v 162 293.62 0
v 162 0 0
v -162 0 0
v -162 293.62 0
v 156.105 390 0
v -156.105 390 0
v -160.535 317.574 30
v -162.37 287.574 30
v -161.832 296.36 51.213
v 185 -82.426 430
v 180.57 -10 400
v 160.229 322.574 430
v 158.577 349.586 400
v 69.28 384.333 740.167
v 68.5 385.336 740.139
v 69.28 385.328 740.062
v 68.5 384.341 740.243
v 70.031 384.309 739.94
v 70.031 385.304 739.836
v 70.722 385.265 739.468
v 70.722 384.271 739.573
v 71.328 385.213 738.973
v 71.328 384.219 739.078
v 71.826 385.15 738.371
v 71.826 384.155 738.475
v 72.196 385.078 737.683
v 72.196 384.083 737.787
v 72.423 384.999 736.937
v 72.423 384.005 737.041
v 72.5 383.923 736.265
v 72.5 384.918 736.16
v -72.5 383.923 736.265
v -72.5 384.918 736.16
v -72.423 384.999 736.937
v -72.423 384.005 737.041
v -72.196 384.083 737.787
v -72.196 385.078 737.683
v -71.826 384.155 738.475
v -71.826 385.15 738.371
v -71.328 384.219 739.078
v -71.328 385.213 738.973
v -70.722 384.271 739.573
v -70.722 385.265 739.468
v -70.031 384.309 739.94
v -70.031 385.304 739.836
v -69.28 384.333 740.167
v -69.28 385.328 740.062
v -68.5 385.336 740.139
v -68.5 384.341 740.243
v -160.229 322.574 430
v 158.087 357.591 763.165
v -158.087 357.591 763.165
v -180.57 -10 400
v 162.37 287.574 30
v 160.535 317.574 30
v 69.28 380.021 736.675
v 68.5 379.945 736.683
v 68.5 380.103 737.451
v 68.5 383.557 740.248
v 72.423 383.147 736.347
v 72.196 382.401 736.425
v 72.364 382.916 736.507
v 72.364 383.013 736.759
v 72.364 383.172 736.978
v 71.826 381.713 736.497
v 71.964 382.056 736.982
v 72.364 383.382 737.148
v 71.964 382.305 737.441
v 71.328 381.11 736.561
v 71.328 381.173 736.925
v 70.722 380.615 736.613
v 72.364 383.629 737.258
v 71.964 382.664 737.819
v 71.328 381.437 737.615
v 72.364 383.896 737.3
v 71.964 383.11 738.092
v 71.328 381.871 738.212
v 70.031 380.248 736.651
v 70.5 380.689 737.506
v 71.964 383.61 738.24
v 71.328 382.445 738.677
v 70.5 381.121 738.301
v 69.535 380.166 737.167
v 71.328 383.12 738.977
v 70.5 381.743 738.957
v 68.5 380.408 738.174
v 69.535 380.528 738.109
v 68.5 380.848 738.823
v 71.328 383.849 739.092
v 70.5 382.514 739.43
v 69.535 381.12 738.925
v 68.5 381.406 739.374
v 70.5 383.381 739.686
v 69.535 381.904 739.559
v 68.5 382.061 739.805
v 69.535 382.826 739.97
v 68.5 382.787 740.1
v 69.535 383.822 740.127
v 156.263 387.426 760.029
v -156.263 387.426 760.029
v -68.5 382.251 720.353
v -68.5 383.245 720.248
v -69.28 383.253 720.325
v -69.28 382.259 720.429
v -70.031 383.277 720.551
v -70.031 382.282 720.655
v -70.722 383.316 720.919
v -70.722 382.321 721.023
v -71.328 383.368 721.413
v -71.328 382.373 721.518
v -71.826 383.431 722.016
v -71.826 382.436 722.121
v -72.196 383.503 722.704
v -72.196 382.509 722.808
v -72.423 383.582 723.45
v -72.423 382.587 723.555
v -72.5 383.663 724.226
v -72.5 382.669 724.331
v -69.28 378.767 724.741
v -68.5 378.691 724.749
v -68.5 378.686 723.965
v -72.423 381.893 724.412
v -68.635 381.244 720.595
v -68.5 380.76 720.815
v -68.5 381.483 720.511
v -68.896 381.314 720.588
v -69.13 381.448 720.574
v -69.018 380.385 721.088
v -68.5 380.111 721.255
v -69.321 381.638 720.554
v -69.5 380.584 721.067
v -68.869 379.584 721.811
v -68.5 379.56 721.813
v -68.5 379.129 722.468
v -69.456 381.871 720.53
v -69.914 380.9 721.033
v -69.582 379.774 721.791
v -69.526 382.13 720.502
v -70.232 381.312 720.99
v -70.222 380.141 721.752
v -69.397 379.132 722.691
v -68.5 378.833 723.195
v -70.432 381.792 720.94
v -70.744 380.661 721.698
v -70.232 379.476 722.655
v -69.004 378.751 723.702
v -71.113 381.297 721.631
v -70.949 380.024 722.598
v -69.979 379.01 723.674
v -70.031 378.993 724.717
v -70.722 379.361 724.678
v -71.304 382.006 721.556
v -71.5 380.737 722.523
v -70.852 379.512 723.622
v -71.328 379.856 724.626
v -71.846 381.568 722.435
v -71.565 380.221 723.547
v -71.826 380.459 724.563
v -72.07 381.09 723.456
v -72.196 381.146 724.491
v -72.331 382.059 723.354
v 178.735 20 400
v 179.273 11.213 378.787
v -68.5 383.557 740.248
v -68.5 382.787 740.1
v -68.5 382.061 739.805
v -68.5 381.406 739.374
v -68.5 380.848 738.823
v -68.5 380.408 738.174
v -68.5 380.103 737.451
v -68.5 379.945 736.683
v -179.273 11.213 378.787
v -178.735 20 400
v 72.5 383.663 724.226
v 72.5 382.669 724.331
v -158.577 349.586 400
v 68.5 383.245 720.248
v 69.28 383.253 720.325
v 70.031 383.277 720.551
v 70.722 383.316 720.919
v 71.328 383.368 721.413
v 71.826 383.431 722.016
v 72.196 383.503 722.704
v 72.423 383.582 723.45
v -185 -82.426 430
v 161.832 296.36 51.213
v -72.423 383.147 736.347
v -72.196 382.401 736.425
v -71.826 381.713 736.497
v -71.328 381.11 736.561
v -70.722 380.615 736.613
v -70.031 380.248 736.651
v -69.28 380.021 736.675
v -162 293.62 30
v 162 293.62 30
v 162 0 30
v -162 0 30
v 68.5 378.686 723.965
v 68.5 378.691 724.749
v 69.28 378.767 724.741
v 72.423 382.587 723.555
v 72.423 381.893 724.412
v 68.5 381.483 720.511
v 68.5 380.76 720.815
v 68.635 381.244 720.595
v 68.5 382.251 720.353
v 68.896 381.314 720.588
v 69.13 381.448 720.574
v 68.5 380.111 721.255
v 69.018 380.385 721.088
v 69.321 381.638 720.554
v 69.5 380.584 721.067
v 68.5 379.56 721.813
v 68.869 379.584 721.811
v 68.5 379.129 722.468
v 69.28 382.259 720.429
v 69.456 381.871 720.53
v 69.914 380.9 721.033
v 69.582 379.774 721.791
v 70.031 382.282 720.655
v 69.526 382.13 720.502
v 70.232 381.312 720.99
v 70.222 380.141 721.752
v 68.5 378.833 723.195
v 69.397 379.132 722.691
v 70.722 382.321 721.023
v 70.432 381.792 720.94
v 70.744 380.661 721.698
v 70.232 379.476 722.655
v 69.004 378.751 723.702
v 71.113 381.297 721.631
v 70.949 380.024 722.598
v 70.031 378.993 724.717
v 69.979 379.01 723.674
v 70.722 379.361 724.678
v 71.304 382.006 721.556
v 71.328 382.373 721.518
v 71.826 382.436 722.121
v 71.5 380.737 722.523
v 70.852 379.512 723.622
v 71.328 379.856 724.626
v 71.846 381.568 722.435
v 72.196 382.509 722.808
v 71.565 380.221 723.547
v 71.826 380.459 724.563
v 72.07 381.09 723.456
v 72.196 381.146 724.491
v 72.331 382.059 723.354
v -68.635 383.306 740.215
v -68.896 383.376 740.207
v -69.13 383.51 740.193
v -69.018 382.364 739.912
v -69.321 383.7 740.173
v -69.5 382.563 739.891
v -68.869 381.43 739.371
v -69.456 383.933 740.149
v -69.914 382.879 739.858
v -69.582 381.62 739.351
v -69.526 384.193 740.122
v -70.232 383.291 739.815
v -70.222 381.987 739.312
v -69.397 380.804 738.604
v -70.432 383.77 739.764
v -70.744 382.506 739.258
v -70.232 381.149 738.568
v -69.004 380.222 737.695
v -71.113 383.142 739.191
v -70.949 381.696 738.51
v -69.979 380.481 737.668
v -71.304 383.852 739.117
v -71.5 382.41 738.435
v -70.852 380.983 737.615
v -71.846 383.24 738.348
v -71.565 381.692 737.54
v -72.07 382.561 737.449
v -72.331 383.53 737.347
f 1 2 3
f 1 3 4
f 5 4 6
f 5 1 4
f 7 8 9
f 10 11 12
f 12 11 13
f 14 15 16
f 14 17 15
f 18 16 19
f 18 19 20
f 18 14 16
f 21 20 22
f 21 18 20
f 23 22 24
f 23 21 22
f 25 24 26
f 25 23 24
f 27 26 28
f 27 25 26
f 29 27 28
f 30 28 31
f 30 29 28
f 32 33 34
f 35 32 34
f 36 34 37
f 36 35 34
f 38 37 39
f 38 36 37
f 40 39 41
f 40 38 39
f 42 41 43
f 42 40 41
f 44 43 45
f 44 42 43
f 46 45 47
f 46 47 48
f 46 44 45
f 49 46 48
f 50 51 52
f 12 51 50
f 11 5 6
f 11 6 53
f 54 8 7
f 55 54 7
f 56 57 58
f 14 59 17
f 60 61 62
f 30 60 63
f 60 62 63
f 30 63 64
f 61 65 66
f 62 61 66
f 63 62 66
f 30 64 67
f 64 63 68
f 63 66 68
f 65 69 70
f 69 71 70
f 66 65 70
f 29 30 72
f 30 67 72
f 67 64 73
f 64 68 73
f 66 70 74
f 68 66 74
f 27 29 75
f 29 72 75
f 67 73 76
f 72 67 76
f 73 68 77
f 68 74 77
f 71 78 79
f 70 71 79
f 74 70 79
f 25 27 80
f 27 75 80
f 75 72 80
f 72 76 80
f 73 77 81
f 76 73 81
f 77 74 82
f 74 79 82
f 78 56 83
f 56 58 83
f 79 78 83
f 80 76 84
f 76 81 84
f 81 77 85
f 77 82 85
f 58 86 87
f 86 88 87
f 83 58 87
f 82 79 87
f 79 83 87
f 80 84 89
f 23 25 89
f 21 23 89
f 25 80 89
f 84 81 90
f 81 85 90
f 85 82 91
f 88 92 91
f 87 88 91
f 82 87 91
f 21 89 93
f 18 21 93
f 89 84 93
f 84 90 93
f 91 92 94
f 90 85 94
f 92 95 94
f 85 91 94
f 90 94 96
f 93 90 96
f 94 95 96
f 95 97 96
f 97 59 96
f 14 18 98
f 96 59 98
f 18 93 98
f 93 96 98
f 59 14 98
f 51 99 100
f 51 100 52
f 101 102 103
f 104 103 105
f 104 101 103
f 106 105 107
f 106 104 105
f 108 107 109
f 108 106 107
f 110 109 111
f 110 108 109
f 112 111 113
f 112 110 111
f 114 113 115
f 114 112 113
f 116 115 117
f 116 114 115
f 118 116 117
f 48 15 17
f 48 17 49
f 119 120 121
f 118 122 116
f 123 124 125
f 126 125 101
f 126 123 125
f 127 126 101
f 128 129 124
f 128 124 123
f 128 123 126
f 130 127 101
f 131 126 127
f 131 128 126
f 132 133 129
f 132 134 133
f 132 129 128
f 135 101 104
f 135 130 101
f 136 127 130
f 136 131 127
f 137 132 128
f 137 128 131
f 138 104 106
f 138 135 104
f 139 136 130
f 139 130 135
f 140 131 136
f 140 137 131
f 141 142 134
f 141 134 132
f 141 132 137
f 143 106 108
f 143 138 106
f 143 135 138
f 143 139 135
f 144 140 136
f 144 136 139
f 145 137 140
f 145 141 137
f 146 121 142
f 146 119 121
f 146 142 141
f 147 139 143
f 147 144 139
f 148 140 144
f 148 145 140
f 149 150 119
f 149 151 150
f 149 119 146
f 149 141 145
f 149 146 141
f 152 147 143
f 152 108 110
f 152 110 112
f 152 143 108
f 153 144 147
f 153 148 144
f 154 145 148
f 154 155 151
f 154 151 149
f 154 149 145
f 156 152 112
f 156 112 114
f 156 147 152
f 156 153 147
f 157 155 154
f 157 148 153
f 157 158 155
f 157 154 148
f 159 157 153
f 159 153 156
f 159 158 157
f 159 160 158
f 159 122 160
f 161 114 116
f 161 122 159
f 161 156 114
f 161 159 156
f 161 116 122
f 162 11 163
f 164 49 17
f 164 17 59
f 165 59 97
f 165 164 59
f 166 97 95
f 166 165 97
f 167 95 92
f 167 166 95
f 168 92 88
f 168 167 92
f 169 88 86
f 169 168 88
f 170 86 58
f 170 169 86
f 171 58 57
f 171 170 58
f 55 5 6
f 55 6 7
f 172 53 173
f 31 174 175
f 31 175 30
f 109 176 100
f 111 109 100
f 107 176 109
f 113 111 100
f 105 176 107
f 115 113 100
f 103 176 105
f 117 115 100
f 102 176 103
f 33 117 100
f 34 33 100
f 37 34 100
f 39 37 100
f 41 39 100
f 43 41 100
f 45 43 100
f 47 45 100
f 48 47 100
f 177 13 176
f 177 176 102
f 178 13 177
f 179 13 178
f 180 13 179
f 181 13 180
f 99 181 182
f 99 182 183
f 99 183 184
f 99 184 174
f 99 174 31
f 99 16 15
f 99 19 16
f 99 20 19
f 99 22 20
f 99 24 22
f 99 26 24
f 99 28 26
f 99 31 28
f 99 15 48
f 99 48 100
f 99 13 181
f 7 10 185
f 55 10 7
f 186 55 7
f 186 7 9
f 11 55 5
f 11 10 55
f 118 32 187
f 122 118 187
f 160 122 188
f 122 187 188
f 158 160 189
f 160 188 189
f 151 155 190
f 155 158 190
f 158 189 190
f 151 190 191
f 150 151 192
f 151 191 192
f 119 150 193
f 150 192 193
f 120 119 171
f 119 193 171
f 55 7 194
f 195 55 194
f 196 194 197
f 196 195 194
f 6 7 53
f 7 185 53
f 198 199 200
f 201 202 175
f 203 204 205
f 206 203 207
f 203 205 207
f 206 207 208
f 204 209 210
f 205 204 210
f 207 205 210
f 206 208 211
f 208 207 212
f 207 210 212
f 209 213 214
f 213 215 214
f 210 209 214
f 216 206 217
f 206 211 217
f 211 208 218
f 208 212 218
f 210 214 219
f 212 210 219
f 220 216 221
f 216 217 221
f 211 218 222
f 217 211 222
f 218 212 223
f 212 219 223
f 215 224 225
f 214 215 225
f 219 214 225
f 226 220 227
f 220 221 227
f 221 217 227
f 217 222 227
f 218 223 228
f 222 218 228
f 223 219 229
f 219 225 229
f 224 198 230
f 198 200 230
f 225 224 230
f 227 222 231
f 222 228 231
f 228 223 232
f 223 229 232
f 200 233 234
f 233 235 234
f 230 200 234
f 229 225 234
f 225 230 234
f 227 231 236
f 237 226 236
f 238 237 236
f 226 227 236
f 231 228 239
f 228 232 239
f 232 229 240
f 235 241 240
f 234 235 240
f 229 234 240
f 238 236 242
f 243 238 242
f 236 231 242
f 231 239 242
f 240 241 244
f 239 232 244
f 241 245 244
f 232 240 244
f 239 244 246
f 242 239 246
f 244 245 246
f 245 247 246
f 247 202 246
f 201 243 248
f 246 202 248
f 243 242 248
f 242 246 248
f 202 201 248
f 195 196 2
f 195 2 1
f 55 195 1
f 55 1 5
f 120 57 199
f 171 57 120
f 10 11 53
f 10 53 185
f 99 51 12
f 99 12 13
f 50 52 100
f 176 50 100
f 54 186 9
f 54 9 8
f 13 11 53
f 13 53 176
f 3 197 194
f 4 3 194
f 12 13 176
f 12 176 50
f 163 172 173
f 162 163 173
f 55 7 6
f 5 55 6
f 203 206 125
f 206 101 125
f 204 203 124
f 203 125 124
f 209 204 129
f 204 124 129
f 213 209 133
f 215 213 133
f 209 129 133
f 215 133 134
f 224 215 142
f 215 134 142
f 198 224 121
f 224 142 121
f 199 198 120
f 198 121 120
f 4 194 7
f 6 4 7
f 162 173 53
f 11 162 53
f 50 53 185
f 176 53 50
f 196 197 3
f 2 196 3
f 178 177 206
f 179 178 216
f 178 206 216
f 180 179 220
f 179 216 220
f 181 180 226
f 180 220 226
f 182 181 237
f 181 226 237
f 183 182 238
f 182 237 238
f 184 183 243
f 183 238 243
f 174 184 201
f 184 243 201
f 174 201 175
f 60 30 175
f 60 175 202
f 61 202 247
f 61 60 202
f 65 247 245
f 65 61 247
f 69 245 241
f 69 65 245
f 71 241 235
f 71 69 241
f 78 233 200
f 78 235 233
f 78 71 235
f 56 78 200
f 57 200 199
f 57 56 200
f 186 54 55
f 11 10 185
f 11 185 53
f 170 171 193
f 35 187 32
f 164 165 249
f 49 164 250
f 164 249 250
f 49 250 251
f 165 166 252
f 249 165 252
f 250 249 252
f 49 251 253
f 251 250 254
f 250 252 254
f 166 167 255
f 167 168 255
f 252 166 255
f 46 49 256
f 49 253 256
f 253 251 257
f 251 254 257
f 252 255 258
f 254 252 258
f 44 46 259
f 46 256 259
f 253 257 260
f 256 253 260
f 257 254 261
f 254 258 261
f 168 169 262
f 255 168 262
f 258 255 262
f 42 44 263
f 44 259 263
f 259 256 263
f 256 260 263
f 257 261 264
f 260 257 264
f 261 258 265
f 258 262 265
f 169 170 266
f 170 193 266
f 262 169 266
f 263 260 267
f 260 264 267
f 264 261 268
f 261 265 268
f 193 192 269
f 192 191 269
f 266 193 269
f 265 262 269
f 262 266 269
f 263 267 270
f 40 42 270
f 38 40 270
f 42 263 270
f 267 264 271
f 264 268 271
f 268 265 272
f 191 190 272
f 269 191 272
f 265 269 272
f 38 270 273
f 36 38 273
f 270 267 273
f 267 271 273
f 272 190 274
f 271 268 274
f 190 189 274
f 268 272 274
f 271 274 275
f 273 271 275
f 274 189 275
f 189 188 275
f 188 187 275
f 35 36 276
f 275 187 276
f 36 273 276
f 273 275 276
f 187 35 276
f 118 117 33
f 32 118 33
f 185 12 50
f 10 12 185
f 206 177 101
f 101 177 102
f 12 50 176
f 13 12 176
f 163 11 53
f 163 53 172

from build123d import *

# Parameters (mm, degrees)
F1_DEPTH      = 162
F2_DEPTH      = 162
F3_DEPTH      = 185
F4_DEPTH      = 185
F5_DEPTH      = 185
F5_DEPTH_BACK = 185
F6_DEPTH      = 185
F6_DEPTH_BACK = 185
F8_DEPTH      = 1053
F11_W         = 145
F11_H         = 20
F12_DEPTH     = 5
F13_R         = 4


with BuildPart() as f1:
    # F0 (on Right) → F1 (new body, symmetric)
    with BuildSketch(Plane.YZ):
        Polygon((322.5735931288, 430), (349.5857144577, 400), (387.4262851845, 760.0289810503), (357.5906283235, 763.1648349484), align=None)
    extrude(amount=F1_DEPTH, both=True)


with BuildPart() as f2:
    # F0 (on Right) → F2 (new body, symmetric)
    with BuildSketch(Plane.YZ):
        Polygon((0, 30), (0, 0), (390, 0), (317.5735931288, 30), (287.5735931288, 30), align=None)
    extrude(amount=F2_DEPTH, both=True)


with BuildPart() as f3:
    # F0 (on Right) → F3 (new body, symmetric)
    with BuildSketch(Plane.YZ):
        Polygon((-82.4264068712, 430), (-10, 400), (20, 400), (349.5857144577, 400), (322.5735931288, 430), align=None)
    extrude(amount=F3_DEPTH, both=True)


with BuildPart() as f4:
    # F0 (on Right) → F4 (new body, symmetric)
    with BuildSketch(Plane.YZ):
        Polygon((317.5735931288, 30), (390, 0), (11.2132034356, 378.7867965644), (-10, 400), (-82.4264068712, 430), (296.3603896932, 51.2132034356), align=None)
    extrude(amount=F4_DEPTH, both=True)


with BuildPart() as f5:
    # F0 (on Right) → F5 (new body, two sides)
    with BuildSketch(Plane.YZ) as f5_sk:
        Polygon((287.5735931288, 30), (317.5735931288, 30), (296.3603896932, 51.2132034356), align=None)
    extrude(amount=F5_DEPTH)
    extrude(f5_sk.sketch, amount=-F5_DEPTH_BACK)


with BuildPart() as f6:
    # F0 (on Right) → F6 (new body, two sides)
    with BuildSketch(Plane.YZ) as f6_sk:
        Polygon((-10, 400), (11.2132034356, 378.7867965644), (20, 400), align=None)
    extrude(amount=-F6_DEPTH)
    extrude(f6_sk.sketch, amount=F6_DEPTH_BACK)


with BuildPart() as f8:
    # F7 (on Top) → F8 (new body)
    with BuildSketch(Plane.XY):
        Polygon((-310.789078474, -330.91121912), (-185, -82.4264068712), (-149.7033394882, 494.6688912855), (-227.649176174, 499.436262887), align=None)
    extrude(amount=F8_DEPTH)


with BuildPart() as f9_1:
    # F9: instance of F8
    add(f8.part.mirror(Plane.YZ))


with BuildPart() as f2_1:
    add(f2.part)

    # F10: cut F8, F9_1
    add(f8.part, mode=Mode.SUBTRACT)
    add(f9_1.part, mode=Mode.SUBTRACT)


with BuildPart() as f3_1:
    add(f3.part)

    # F10: cut F8, F9_1
    add(f8.part, mode=Mode.SUBTRACT)
    add(f9_1.part, mode=Mode.SUBTRACT)


with BuildPart() as f1_1:
    add(f1.part)

    # F10: cut F8, F9_1
    add(f8.part, mode=Mode.SUBTRACT)
    add(f9_1.part, mode=Mode.SUBTRACT)

    # F11 (on face) → F12 (cut)
    with BuildSketch(Plane(origin=(0, 304.1837329891, -31.9709986361), x_dir=(-1, 0, 0), z_dir=(0, 0.9945218954, -0.1045284633))):
        with Locations((0, 766.3625369888)):
            Rectangle(F11_W, F11_H)
    extrude(amount=-F12_DEPTH, mode=Mode.SUBTRACT)

    # F13
    f13_edges = [f1_1.edges().sort_by_distance(p)[0] for p in [
        (-72.5, 379.317822, 730.715967),
        (0, 380.363106, 740.661185),
        (72.5, 379.317822, 730.715967),
        (0, 378.272537, 720.770748),
        (-72.5, 382.849411, 740.399864),
        (-72.5, 380.758842, 720.509426),
        (72.5, 382.849411, 740.399864),
        (72.5, 380.758842, 720.509426),
    ]]
    fillet(f13_edges, radius=F13_R)


with BuildPart() as f4_1:
    add(f4.part)

    # F10: cut F8, F9_1
    add(f8.part, mode=Mode.SUBTRACT)
    add(f9_1.part, mode=Mode.SUBTRACT)


with BuildPart() as f5_1:
    add(f5.part)

    # F10: cut F8, F9_1
    add(f8.part, mode=Mode.SUBTRACT)
    add(f9_1.part, mode=Mode.SUBTRACT)


with BuildPart() as f6_1:
    add(f6.part)

    # F10: cut F8, F9_1
    add(f8.part, mode=Mode.SUBTRACT)
    add(f9_1.part, mode=Mode.SUBTRACT)


solid = Compound([f2_1.part, f3_1.part, f1_1.part, f4_1.part, f5_1.part, f6_1.part])
